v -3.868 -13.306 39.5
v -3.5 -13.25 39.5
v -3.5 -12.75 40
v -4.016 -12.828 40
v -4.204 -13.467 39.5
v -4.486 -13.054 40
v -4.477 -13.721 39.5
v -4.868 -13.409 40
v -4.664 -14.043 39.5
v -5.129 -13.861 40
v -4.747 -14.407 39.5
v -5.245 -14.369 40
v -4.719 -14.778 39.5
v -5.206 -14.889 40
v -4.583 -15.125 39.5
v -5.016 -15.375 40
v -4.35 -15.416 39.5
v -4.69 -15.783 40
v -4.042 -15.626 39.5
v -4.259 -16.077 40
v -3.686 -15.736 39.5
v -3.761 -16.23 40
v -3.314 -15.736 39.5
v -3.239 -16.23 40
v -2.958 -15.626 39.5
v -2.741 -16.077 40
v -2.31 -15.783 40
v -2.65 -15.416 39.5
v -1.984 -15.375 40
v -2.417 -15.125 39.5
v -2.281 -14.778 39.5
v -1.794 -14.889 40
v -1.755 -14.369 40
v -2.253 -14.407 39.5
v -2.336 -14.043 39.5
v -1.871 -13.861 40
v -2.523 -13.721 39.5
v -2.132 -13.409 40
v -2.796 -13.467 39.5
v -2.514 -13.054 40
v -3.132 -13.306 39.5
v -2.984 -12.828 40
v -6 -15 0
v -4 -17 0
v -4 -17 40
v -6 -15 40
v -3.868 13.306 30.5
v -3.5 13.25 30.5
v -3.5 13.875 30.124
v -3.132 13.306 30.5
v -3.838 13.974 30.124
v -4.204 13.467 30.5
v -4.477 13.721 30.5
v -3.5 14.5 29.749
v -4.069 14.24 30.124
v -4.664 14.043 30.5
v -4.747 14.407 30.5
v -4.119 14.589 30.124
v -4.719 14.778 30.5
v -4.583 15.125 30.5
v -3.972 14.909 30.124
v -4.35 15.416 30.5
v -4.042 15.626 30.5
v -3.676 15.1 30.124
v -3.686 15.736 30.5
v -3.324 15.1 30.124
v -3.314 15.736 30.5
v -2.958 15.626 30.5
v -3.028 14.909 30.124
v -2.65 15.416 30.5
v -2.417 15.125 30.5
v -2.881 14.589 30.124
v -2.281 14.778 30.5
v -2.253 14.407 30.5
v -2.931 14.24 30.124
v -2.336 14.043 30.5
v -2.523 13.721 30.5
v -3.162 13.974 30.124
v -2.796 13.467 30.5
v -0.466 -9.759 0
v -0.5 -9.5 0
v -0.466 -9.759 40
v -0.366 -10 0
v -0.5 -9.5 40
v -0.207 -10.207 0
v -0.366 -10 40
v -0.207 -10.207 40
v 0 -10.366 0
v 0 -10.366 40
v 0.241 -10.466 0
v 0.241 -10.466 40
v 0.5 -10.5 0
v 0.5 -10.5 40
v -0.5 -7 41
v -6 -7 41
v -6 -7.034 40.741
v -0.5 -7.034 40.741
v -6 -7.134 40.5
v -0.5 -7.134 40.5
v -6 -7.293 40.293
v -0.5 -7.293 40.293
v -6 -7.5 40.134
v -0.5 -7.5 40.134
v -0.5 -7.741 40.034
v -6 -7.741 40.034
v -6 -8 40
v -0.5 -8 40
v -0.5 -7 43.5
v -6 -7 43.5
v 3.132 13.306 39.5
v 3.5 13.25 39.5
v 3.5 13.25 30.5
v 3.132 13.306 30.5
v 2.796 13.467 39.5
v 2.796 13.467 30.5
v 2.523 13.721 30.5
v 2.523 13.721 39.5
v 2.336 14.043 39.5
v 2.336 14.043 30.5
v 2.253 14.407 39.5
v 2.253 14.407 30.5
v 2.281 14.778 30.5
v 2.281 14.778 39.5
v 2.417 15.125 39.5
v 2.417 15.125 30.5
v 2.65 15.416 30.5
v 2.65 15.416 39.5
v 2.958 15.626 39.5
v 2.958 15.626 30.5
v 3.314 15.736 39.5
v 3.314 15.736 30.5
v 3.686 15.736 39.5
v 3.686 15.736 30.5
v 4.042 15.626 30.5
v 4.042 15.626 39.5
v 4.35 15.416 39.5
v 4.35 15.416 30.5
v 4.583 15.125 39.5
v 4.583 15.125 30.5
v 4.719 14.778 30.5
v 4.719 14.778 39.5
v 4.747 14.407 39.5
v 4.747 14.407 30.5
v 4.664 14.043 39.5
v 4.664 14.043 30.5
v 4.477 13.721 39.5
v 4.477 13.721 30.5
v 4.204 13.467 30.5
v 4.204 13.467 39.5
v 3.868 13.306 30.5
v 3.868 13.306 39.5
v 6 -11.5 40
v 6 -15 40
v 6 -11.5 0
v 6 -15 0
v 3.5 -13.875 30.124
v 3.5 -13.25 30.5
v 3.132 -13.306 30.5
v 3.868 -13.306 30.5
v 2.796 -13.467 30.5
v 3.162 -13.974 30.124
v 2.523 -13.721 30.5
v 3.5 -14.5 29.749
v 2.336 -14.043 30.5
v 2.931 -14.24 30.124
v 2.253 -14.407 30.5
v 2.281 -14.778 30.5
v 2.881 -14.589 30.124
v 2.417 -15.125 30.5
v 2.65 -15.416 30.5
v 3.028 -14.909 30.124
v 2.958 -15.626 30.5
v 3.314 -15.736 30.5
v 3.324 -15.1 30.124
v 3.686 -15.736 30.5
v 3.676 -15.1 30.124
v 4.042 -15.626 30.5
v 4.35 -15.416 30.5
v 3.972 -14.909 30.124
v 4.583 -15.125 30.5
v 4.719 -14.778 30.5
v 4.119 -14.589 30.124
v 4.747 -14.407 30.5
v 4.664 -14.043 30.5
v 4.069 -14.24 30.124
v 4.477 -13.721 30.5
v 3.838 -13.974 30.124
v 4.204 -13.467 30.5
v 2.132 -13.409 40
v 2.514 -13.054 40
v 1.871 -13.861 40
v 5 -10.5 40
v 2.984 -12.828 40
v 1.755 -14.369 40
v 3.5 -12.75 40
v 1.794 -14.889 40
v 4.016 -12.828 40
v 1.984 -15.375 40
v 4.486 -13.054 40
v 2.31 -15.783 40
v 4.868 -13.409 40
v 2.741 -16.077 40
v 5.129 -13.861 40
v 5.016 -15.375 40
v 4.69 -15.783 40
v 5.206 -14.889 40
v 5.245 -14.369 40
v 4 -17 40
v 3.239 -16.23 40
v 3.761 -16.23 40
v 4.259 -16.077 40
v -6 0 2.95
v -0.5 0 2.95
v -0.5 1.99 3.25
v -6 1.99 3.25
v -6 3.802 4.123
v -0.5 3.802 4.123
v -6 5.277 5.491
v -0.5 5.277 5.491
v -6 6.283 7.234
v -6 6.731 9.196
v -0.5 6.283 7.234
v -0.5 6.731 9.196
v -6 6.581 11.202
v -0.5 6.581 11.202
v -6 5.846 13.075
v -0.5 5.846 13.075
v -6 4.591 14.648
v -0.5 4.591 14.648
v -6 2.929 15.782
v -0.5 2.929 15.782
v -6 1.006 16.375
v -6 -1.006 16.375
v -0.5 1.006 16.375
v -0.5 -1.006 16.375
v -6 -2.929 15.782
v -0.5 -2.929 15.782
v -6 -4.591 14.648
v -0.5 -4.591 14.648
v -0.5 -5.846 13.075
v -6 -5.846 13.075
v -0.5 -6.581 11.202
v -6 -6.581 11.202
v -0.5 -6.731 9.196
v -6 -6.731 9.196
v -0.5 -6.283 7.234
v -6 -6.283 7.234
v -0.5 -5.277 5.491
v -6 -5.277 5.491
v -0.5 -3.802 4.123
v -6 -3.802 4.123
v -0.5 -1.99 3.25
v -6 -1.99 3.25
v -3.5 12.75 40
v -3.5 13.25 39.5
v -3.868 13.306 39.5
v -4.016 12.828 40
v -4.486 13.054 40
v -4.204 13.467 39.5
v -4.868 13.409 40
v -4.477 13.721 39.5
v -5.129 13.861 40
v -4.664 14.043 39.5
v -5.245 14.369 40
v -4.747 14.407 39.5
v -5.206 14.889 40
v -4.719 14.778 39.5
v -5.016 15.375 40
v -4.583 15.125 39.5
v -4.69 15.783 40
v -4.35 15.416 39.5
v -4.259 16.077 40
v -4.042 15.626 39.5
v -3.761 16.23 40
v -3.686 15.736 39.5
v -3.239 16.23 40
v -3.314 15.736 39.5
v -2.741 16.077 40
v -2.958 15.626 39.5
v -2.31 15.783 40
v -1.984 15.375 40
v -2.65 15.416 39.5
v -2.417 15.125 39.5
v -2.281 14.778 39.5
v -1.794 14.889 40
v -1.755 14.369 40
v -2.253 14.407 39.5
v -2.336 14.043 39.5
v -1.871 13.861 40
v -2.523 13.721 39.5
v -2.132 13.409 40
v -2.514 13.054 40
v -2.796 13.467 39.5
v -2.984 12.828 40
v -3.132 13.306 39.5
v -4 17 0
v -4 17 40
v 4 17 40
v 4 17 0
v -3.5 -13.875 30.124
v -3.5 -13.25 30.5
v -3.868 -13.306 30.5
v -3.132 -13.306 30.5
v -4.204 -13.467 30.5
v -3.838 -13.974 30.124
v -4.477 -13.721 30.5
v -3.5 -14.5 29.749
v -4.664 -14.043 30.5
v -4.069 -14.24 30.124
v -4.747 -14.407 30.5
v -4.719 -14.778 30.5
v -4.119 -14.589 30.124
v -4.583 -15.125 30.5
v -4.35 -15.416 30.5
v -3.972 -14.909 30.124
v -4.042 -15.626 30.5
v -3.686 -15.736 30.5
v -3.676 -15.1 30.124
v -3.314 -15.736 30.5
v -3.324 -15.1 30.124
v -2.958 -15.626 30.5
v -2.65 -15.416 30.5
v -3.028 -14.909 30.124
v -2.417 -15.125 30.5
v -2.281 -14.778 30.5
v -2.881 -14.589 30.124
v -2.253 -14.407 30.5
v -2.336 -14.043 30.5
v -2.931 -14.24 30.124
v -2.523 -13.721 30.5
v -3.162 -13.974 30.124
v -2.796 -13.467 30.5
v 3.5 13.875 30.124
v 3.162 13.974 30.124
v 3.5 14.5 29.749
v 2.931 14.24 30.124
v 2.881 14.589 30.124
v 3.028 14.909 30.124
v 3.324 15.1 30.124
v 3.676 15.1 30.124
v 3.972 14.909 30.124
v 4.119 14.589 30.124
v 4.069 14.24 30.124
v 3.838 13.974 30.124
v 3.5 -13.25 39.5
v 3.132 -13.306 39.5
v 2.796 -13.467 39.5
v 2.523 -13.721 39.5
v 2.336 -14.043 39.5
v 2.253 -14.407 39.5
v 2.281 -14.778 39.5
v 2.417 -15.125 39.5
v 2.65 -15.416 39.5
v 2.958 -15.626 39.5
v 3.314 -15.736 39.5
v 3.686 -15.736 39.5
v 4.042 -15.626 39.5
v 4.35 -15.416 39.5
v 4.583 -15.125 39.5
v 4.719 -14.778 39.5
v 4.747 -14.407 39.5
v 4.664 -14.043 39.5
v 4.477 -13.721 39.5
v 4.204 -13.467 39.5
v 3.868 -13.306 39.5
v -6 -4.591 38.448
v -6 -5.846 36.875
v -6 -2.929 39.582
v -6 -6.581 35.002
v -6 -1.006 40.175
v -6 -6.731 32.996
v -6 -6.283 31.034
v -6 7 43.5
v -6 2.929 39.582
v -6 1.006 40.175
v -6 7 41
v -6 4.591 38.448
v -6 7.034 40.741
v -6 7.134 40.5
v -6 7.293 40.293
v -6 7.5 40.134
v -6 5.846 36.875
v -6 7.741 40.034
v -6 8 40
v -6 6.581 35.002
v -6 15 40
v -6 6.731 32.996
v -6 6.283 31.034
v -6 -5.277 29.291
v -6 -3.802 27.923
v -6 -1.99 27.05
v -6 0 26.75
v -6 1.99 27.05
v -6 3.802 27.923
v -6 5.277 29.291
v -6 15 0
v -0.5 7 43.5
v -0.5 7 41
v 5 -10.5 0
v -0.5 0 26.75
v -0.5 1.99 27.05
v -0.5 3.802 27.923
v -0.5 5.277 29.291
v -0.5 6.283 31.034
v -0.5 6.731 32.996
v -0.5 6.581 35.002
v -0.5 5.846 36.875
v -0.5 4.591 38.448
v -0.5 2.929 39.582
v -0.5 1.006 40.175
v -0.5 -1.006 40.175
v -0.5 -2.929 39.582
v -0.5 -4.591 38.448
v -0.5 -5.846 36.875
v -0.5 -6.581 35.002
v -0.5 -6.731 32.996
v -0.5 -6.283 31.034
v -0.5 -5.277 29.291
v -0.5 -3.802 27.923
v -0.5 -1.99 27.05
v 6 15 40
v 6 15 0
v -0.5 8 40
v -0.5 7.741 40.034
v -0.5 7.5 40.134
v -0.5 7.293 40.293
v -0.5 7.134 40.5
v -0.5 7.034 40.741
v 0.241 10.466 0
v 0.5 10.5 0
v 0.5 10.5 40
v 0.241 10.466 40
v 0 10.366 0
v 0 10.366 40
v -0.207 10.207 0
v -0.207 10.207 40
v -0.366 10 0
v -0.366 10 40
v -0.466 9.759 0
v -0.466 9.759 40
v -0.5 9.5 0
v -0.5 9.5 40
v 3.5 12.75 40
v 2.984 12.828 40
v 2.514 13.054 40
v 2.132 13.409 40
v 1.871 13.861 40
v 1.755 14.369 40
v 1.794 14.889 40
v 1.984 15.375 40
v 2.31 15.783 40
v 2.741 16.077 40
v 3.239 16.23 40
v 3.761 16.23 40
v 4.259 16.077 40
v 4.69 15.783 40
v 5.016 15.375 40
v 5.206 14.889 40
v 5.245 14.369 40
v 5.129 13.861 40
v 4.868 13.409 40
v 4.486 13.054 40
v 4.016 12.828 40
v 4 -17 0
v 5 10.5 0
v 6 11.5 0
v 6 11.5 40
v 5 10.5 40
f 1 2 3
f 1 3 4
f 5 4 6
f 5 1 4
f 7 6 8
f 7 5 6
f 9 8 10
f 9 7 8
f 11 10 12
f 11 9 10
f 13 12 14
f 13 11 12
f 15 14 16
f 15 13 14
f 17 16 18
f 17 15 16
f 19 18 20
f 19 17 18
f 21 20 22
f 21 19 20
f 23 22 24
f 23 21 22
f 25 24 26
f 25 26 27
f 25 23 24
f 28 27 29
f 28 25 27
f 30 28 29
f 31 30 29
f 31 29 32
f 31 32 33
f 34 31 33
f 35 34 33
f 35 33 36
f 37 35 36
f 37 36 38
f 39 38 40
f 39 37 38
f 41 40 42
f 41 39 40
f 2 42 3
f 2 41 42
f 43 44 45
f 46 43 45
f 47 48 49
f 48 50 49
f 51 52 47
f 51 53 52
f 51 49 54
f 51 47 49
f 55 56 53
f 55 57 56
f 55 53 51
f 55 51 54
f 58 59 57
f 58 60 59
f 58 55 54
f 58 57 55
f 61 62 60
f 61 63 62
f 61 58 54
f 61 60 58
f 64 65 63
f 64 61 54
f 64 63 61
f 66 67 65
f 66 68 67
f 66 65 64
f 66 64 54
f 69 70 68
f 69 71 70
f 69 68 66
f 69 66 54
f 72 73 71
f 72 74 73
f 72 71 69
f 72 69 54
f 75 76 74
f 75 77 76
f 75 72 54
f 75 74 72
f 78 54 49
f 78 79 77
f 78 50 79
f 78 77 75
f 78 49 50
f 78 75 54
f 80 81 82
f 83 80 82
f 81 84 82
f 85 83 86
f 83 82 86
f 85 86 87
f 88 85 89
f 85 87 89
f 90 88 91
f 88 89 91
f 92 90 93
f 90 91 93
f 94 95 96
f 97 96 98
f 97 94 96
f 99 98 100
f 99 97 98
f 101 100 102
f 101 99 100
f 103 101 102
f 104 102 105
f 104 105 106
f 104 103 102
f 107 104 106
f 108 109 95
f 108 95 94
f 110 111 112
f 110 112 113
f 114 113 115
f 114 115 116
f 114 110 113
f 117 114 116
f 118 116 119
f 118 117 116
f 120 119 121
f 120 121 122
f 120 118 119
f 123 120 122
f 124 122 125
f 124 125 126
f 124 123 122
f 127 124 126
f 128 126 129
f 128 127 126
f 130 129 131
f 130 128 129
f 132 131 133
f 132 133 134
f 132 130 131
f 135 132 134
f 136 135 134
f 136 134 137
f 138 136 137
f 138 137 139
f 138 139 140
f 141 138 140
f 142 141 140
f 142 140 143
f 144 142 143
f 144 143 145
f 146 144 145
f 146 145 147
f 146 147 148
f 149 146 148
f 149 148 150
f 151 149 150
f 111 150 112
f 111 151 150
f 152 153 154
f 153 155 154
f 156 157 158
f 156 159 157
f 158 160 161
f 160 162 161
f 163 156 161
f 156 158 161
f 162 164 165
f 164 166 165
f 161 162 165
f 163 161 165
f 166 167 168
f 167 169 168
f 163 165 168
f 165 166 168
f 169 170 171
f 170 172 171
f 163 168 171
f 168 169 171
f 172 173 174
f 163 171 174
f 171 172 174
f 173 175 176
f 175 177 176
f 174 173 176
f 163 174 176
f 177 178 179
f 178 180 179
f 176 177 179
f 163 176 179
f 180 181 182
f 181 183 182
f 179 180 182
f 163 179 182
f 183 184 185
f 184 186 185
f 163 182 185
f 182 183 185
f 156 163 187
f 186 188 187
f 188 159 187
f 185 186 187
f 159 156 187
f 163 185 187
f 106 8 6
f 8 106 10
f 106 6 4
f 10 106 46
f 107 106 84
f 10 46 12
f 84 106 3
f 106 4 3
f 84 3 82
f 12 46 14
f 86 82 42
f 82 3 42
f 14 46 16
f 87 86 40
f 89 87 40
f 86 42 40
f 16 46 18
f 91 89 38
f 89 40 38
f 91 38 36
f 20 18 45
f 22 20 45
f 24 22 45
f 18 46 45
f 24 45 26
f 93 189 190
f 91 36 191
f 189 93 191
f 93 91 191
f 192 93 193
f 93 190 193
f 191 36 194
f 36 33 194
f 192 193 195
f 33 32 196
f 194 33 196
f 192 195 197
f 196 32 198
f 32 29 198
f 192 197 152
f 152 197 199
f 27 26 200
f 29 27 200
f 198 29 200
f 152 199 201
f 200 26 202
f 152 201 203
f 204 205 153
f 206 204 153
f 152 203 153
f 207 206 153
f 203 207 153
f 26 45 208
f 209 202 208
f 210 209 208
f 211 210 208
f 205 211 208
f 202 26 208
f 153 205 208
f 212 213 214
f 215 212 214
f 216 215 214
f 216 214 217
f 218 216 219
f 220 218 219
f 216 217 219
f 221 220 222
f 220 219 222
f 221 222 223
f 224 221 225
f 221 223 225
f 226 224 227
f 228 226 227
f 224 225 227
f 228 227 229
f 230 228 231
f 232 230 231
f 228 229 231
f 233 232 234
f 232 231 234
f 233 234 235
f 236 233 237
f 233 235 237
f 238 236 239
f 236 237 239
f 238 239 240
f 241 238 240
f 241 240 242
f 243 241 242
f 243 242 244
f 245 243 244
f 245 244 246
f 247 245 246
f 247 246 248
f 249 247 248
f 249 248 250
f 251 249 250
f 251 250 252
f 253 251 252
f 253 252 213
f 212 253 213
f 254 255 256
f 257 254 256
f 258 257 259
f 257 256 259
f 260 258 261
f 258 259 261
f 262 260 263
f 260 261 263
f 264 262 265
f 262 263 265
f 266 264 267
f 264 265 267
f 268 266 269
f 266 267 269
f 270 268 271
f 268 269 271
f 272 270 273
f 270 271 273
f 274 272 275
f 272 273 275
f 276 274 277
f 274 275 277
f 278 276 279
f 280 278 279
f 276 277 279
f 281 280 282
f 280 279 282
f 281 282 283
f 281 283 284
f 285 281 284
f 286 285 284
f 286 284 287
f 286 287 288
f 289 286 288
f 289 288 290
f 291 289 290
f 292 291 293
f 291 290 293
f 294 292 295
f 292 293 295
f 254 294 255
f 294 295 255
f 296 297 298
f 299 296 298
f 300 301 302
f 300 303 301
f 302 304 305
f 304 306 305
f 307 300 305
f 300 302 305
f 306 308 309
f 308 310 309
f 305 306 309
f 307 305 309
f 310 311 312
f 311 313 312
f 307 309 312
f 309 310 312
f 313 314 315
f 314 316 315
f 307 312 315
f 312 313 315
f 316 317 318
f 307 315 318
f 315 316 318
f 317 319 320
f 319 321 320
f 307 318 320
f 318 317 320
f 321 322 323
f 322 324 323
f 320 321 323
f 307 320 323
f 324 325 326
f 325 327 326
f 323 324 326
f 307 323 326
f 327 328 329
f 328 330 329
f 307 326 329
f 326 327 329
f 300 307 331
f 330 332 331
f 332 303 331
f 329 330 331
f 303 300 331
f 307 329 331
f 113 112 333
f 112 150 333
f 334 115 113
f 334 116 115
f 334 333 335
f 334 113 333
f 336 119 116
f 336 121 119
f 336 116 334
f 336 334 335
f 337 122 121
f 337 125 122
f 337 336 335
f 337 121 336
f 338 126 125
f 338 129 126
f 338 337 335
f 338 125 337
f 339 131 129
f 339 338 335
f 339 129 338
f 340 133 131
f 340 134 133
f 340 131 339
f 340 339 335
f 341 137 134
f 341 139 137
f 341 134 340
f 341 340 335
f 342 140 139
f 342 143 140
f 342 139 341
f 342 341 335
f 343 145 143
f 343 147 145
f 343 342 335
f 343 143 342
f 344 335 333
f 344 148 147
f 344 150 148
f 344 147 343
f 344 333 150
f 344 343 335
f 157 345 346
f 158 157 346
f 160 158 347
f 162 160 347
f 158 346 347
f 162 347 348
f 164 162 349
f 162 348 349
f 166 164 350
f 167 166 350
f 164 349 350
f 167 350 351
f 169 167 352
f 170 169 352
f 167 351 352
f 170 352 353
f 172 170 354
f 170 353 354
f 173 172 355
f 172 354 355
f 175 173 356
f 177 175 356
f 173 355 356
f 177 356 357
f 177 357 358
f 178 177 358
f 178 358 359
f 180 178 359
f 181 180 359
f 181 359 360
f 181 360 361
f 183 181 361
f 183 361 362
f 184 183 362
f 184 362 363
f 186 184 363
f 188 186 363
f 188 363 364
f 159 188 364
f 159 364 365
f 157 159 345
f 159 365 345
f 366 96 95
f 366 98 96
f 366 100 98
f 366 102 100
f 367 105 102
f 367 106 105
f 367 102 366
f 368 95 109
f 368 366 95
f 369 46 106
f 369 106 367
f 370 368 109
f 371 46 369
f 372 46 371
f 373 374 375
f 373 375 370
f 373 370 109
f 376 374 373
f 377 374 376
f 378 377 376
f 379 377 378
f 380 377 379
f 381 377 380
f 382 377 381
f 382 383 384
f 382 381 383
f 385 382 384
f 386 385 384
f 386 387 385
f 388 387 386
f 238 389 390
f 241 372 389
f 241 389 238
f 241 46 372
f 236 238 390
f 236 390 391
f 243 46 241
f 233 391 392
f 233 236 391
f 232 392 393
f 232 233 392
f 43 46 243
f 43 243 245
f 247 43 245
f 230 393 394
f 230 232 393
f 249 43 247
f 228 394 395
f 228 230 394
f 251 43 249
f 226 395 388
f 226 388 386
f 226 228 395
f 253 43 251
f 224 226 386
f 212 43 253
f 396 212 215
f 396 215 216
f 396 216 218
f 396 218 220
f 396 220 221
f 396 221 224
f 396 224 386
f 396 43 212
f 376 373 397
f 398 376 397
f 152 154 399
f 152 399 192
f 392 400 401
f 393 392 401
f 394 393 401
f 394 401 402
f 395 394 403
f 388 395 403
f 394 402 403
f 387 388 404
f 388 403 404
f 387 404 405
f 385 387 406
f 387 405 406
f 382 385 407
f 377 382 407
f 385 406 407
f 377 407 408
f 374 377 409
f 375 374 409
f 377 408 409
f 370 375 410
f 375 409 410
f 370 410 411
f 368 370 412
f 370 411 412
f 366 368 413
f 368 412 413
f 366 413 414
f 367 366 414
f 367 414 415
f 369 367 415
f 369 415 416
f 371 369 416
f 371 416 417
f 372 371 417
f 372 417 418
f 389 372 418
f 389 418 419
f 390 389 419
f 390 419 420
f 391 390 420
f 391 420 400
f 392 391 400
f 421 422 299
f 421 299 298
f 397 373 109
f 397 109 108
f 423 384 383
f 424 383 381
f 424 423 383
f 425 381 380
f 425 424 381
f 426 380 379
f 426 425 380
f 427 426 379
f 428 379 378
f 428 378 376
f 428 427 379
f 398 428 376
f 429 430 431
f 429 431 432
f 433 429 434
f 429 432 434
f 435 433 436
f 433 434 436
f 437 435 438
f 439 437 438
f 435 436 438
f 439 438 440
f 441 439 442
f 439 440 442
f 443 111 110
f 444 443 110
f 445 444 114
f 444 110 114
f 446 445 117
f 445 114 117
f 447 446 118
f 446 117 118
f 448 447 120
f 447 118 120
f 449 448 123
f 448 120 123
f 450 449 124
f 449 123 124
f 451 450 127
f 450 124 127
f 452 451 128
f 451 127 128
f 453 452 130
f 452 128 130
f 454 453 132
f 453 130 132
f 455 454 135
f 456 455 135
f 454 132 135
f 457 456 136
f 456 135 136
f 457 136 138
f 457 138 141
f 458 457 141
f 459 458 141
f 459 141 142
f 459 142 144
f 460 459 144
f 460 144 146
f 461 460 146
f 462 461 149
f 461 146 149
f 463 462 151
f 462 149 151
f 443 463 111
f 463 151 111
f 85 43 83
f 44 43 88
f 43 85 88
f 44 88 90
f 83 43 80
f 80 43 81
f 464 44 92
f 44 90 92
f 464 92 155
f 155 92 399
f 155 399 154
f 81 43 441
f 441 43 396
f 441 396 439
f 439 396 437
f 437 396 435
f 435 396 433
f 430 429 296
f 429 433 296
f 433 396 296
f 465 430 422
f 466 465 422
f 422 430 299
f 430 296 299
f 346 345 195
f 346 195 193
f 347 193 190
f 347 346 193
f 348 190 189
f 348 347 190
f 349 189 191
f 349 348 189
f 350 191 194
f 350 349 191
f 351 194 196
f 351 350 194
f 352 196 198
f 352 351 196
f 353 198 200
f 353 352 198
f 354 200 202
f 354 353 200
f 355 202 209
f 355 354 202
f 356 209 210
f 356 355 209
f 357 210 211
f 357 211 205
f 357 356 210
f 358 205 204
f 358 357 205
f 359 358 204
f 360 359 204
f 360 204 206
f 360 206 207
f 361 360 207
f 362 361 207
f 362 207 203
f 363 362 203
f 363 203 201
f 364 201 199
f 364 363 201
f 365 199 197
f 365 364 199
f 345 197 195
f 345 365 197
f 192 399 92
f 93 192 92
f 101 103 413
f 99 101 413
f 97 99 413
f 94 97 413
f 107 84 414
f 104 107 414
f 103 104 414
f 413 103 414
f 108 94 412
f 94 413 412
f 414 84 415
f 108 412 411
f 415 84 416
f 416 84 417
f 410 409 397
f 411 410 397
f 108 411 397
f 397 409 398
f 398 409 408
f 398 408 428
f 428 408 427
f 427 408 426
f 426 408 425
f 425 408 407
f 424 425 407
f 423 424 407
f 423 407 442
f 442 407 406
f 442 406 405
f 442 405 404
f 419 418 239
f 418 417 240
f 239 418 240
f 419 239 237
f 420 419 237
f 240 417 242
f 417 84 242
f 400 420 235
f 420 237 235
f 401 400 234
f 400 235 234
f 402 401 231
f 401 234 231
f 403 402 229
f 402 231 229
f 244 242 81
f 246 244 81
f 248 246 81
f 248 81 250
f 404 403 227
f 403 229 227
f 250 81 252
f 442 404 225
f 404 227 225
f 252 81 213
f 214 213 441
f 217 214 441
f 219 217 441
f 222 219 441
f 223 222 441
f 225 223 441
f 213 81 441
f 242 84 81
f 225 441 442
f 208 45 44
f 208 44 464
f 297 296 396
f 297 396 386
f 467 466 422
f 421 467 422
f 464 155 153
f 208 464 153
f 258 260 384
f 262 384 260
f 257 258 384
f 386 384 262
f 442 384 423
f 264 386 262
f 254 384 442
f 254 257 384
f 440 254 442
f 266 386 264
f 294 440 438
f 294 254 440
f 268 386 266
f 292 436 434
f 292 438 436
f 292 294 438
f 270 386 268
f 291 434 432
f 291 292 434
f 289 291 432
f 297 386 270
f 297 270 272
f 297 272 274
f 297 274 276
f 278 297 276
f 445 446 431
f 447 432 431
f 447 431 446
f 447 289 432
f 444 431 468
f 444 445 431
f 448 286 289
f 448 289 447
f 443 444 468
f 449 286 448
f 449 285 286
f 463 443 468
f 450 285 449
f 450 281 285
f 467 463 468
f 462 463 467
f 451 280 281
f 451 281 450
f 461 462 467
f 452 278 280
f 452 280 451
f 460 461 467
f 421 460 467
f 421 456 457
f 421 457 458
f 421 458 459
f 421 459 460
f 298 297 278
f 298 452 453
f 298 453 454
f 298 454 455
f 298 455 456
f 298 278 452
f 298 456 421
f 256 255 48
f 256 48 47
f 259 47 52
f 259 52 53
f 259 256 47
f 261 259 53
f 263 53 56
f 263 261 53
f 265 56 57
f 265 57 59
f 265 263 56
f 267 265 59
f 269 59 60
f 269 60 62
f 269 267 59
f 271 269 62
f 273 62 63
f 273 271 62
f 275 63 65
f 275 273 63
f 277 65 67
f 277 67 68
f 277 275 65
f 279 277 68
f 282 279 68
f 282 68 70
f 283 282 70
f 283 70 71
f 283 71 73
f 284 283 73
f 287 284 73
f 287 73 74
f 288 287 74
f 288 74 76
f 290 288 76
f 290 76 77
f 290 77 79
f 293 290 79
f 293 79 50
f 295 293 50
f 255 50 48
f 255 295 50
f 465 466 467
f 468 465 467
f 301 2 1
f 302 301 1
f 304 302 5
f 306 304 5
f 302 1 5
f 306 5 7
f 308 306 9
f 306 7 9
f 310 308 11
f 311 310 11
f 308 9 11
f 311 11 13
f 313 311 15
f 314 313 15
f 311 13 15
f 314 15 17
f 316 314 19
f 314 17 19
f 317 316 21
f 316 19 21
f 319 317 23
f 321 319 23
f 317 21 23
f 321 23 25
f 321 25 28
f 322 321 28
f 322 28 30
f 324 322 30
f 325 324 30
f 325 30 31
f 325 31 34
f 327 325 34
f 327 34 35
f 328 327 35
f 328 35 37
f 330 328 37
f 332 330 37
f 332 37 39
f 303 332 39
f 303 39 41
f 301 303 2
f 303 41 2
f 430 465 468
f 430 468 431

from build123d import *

# Parameters (mm, degrees)
SKETCH_1_W                  = 12
SKETCH_1_H                  = 34
EXTRUDE_1_DEPTH             = 43.5
SKETCH_3_R                  = 6.75
CUT_EXTRUDE_1_DEPTH         = 49.220846115
SKETCH_4_W                  = 12
SKETCH_4_H                  = 10
CUT_EXTRUDE_2_DEPTH         = 3.5
FILLET_1_R                  = 1
HOLE_WIZARD_M3_1_AT_2_COUNT = 2
HOLE_WIZARD_M3_1_AT_2_PITCH = 7
CHAMFER_1_SIZE              = 0.5
SKETCH_7_W                  = 13
SKETCH_7_H                  = 21
CUT_EXTRUDE_3_DEPTH         = 48.087684165
CHAMFER_2_SIZE              = 2
CHAMFER_3_SIZE              = 1
FILLET_2_R                  = 1


with BuildPart() as part:
    # 草图1 → 凸台-拉伸1 (new body)
    with BuildSketch(Plane.XY):
        Rectangle(SKETCH_1_W, SKETCH_1_H)
    extrude(amount=EXTRUDE_1_DEPTH)

    # 草图3 → 切除-拉伸1 (cut, through all)
    with BuildSketch(Plane(origin=(6, 0, 0), x_dir=(0, 0, -1), z_dir=(1, 0, 0))):
        with Locations((-33.5, 0)):
            Circle(SKETCH_3_R)
        with Locations((-9.7, 0)):
            Circle(SKETCH_3_R)
    extrude(amount=-CUT_EXTRUDE_1_DEPTH, mode=Mode.SUBTRACT)

    # 草图4 → 切除-拉伸2 (cut)
    with BuildSketch(Plane.XY.offset(43.5)):
        with Locations((0, 12)):
            Rectangle(SKETCH_4_W, SKETCH_4_H)
    cut_extrude_2 = extrude(amount=-CUT_EXTRUDE_2_DEPTH, mode=Mode.SUBTRACT)

    # 镜向1: 切除-拉伸2 across plane
    add(cut_extrude_2.mirror(Plane.ZX), mode=Mode.SUBTRACT)

    # 圆角1
    fillet_1_edges = [part.edges().sort_by_distance(p)[0] for p in [
        (0, 7, 40),
        (0, -7, 40),
    ]]
    fillet(fillet_1_edges, radius=FILLET_1_R)

    # 草图5 → M3 螺纹孔1 (revolve, cut)
    with BuildSketch(Plane(origin=(3.5, 14.5, 40), x_dir=(0, -1, 0), z_dir=(1, 0, 0))):
        Polygon((0, 0), (0, 10.251075774), (1.25, 9.5), (1.25, 0), align=None)
    hole_wizard_m3_1 = revolve(axis=Axis((3.5, 14.5, 46.35), (0, 0, -1)), mode=Mode.SUBTRACT)

    # M3 螺纹孔1 at 2: M3 螺纹孔1 ×2
    with Locations(*[(-i * HOLE_WIZARD_M3_1_AT_2_PITCH, 0, 0) for i in range(1, HOLE_WIZARD_M3_1_AT_2_COUNT)]):
        add(hole_wizard_m3_1, mode=Mode.SUBTRACT)

    # 镜向2: M3 螺纹孔1 across plane
    add(hole_wizard_m3_1.mirror(Plane.ZX), mode=Mode.SUBTRACT)

    # 镜向2 copy 1 sketch → 镜向2 copy 1 (revolve, cut)
    with BuildSketch(Plane(origin=(-3.5, -14.5, 40), x_dir=(0, 1, 0), z_dir=(1, 0, 0))):
        Polygon((0, 0), (0, -10.251075774), (1.25, -9.5), (1.25, 0), align=None)
    revolve(axis=Axis((-3.5, -14.5, 46.35), (0, 0, 1)), mode=Mode.SUBTRACT)

    # 倒角1
    chamfer_1_edges = [part.edges().sort_by_distance(p)[0] for p in [
        (-3.5, 15.75, 40),
        (3.5, 15.75, 40),
        (-3.5, -15.75, 40),
        (3.5, -15.75, 40),
    ]]
    chamfer(chamfer_1_edges, length=CHAMFER_1_SIZE)

    # 草图7 → 切除-拉伸3 (cut, through all)
    with BuildSketch(Plane(origin=(0, 0, 0), x_dir=(-1, 0, 0), z_dir=(0, 0, -1))):
        with Locations((-6, 0)):
            Rectangle(SKETCH_7_W, SKETCH_7_H)
    extrude(amount=-CUT_EXTRUDE_3_DEPTH, mode=Mode.SUBTRACT)

    # 倒角2
    chamfer_2_edges = [part.edges().sort_by_distance(p)[0] for p in [
        (-6, 17, 20),
        (6, 17, 20),
        (6, -17, 20),
        (-6, -17, 20),
    ]]
    chamfer(chamfer_2_edges, length=CHAMFER_2_SIZE)

    # 倒角3
    chamfer_3_edges = [part.edges().sort_by_distance(p)[0] for p in [
        (6, 10.5, 20),
        (6, -10.5, 20),
    ]]
    chamfer(chamfer_3_edges, length=CHAMFER_3_SIZE)

    # 圆角2
    fillet_2_edges = [part.edges().sort_by_distance(p)[0] for p in [
        (-0.5, -10.5, 20),
        (-0.5, 10.5, 20),
    ]]
    fillet(fillet_2_edges, radius=FILLET_2_R)


solid = part.part
